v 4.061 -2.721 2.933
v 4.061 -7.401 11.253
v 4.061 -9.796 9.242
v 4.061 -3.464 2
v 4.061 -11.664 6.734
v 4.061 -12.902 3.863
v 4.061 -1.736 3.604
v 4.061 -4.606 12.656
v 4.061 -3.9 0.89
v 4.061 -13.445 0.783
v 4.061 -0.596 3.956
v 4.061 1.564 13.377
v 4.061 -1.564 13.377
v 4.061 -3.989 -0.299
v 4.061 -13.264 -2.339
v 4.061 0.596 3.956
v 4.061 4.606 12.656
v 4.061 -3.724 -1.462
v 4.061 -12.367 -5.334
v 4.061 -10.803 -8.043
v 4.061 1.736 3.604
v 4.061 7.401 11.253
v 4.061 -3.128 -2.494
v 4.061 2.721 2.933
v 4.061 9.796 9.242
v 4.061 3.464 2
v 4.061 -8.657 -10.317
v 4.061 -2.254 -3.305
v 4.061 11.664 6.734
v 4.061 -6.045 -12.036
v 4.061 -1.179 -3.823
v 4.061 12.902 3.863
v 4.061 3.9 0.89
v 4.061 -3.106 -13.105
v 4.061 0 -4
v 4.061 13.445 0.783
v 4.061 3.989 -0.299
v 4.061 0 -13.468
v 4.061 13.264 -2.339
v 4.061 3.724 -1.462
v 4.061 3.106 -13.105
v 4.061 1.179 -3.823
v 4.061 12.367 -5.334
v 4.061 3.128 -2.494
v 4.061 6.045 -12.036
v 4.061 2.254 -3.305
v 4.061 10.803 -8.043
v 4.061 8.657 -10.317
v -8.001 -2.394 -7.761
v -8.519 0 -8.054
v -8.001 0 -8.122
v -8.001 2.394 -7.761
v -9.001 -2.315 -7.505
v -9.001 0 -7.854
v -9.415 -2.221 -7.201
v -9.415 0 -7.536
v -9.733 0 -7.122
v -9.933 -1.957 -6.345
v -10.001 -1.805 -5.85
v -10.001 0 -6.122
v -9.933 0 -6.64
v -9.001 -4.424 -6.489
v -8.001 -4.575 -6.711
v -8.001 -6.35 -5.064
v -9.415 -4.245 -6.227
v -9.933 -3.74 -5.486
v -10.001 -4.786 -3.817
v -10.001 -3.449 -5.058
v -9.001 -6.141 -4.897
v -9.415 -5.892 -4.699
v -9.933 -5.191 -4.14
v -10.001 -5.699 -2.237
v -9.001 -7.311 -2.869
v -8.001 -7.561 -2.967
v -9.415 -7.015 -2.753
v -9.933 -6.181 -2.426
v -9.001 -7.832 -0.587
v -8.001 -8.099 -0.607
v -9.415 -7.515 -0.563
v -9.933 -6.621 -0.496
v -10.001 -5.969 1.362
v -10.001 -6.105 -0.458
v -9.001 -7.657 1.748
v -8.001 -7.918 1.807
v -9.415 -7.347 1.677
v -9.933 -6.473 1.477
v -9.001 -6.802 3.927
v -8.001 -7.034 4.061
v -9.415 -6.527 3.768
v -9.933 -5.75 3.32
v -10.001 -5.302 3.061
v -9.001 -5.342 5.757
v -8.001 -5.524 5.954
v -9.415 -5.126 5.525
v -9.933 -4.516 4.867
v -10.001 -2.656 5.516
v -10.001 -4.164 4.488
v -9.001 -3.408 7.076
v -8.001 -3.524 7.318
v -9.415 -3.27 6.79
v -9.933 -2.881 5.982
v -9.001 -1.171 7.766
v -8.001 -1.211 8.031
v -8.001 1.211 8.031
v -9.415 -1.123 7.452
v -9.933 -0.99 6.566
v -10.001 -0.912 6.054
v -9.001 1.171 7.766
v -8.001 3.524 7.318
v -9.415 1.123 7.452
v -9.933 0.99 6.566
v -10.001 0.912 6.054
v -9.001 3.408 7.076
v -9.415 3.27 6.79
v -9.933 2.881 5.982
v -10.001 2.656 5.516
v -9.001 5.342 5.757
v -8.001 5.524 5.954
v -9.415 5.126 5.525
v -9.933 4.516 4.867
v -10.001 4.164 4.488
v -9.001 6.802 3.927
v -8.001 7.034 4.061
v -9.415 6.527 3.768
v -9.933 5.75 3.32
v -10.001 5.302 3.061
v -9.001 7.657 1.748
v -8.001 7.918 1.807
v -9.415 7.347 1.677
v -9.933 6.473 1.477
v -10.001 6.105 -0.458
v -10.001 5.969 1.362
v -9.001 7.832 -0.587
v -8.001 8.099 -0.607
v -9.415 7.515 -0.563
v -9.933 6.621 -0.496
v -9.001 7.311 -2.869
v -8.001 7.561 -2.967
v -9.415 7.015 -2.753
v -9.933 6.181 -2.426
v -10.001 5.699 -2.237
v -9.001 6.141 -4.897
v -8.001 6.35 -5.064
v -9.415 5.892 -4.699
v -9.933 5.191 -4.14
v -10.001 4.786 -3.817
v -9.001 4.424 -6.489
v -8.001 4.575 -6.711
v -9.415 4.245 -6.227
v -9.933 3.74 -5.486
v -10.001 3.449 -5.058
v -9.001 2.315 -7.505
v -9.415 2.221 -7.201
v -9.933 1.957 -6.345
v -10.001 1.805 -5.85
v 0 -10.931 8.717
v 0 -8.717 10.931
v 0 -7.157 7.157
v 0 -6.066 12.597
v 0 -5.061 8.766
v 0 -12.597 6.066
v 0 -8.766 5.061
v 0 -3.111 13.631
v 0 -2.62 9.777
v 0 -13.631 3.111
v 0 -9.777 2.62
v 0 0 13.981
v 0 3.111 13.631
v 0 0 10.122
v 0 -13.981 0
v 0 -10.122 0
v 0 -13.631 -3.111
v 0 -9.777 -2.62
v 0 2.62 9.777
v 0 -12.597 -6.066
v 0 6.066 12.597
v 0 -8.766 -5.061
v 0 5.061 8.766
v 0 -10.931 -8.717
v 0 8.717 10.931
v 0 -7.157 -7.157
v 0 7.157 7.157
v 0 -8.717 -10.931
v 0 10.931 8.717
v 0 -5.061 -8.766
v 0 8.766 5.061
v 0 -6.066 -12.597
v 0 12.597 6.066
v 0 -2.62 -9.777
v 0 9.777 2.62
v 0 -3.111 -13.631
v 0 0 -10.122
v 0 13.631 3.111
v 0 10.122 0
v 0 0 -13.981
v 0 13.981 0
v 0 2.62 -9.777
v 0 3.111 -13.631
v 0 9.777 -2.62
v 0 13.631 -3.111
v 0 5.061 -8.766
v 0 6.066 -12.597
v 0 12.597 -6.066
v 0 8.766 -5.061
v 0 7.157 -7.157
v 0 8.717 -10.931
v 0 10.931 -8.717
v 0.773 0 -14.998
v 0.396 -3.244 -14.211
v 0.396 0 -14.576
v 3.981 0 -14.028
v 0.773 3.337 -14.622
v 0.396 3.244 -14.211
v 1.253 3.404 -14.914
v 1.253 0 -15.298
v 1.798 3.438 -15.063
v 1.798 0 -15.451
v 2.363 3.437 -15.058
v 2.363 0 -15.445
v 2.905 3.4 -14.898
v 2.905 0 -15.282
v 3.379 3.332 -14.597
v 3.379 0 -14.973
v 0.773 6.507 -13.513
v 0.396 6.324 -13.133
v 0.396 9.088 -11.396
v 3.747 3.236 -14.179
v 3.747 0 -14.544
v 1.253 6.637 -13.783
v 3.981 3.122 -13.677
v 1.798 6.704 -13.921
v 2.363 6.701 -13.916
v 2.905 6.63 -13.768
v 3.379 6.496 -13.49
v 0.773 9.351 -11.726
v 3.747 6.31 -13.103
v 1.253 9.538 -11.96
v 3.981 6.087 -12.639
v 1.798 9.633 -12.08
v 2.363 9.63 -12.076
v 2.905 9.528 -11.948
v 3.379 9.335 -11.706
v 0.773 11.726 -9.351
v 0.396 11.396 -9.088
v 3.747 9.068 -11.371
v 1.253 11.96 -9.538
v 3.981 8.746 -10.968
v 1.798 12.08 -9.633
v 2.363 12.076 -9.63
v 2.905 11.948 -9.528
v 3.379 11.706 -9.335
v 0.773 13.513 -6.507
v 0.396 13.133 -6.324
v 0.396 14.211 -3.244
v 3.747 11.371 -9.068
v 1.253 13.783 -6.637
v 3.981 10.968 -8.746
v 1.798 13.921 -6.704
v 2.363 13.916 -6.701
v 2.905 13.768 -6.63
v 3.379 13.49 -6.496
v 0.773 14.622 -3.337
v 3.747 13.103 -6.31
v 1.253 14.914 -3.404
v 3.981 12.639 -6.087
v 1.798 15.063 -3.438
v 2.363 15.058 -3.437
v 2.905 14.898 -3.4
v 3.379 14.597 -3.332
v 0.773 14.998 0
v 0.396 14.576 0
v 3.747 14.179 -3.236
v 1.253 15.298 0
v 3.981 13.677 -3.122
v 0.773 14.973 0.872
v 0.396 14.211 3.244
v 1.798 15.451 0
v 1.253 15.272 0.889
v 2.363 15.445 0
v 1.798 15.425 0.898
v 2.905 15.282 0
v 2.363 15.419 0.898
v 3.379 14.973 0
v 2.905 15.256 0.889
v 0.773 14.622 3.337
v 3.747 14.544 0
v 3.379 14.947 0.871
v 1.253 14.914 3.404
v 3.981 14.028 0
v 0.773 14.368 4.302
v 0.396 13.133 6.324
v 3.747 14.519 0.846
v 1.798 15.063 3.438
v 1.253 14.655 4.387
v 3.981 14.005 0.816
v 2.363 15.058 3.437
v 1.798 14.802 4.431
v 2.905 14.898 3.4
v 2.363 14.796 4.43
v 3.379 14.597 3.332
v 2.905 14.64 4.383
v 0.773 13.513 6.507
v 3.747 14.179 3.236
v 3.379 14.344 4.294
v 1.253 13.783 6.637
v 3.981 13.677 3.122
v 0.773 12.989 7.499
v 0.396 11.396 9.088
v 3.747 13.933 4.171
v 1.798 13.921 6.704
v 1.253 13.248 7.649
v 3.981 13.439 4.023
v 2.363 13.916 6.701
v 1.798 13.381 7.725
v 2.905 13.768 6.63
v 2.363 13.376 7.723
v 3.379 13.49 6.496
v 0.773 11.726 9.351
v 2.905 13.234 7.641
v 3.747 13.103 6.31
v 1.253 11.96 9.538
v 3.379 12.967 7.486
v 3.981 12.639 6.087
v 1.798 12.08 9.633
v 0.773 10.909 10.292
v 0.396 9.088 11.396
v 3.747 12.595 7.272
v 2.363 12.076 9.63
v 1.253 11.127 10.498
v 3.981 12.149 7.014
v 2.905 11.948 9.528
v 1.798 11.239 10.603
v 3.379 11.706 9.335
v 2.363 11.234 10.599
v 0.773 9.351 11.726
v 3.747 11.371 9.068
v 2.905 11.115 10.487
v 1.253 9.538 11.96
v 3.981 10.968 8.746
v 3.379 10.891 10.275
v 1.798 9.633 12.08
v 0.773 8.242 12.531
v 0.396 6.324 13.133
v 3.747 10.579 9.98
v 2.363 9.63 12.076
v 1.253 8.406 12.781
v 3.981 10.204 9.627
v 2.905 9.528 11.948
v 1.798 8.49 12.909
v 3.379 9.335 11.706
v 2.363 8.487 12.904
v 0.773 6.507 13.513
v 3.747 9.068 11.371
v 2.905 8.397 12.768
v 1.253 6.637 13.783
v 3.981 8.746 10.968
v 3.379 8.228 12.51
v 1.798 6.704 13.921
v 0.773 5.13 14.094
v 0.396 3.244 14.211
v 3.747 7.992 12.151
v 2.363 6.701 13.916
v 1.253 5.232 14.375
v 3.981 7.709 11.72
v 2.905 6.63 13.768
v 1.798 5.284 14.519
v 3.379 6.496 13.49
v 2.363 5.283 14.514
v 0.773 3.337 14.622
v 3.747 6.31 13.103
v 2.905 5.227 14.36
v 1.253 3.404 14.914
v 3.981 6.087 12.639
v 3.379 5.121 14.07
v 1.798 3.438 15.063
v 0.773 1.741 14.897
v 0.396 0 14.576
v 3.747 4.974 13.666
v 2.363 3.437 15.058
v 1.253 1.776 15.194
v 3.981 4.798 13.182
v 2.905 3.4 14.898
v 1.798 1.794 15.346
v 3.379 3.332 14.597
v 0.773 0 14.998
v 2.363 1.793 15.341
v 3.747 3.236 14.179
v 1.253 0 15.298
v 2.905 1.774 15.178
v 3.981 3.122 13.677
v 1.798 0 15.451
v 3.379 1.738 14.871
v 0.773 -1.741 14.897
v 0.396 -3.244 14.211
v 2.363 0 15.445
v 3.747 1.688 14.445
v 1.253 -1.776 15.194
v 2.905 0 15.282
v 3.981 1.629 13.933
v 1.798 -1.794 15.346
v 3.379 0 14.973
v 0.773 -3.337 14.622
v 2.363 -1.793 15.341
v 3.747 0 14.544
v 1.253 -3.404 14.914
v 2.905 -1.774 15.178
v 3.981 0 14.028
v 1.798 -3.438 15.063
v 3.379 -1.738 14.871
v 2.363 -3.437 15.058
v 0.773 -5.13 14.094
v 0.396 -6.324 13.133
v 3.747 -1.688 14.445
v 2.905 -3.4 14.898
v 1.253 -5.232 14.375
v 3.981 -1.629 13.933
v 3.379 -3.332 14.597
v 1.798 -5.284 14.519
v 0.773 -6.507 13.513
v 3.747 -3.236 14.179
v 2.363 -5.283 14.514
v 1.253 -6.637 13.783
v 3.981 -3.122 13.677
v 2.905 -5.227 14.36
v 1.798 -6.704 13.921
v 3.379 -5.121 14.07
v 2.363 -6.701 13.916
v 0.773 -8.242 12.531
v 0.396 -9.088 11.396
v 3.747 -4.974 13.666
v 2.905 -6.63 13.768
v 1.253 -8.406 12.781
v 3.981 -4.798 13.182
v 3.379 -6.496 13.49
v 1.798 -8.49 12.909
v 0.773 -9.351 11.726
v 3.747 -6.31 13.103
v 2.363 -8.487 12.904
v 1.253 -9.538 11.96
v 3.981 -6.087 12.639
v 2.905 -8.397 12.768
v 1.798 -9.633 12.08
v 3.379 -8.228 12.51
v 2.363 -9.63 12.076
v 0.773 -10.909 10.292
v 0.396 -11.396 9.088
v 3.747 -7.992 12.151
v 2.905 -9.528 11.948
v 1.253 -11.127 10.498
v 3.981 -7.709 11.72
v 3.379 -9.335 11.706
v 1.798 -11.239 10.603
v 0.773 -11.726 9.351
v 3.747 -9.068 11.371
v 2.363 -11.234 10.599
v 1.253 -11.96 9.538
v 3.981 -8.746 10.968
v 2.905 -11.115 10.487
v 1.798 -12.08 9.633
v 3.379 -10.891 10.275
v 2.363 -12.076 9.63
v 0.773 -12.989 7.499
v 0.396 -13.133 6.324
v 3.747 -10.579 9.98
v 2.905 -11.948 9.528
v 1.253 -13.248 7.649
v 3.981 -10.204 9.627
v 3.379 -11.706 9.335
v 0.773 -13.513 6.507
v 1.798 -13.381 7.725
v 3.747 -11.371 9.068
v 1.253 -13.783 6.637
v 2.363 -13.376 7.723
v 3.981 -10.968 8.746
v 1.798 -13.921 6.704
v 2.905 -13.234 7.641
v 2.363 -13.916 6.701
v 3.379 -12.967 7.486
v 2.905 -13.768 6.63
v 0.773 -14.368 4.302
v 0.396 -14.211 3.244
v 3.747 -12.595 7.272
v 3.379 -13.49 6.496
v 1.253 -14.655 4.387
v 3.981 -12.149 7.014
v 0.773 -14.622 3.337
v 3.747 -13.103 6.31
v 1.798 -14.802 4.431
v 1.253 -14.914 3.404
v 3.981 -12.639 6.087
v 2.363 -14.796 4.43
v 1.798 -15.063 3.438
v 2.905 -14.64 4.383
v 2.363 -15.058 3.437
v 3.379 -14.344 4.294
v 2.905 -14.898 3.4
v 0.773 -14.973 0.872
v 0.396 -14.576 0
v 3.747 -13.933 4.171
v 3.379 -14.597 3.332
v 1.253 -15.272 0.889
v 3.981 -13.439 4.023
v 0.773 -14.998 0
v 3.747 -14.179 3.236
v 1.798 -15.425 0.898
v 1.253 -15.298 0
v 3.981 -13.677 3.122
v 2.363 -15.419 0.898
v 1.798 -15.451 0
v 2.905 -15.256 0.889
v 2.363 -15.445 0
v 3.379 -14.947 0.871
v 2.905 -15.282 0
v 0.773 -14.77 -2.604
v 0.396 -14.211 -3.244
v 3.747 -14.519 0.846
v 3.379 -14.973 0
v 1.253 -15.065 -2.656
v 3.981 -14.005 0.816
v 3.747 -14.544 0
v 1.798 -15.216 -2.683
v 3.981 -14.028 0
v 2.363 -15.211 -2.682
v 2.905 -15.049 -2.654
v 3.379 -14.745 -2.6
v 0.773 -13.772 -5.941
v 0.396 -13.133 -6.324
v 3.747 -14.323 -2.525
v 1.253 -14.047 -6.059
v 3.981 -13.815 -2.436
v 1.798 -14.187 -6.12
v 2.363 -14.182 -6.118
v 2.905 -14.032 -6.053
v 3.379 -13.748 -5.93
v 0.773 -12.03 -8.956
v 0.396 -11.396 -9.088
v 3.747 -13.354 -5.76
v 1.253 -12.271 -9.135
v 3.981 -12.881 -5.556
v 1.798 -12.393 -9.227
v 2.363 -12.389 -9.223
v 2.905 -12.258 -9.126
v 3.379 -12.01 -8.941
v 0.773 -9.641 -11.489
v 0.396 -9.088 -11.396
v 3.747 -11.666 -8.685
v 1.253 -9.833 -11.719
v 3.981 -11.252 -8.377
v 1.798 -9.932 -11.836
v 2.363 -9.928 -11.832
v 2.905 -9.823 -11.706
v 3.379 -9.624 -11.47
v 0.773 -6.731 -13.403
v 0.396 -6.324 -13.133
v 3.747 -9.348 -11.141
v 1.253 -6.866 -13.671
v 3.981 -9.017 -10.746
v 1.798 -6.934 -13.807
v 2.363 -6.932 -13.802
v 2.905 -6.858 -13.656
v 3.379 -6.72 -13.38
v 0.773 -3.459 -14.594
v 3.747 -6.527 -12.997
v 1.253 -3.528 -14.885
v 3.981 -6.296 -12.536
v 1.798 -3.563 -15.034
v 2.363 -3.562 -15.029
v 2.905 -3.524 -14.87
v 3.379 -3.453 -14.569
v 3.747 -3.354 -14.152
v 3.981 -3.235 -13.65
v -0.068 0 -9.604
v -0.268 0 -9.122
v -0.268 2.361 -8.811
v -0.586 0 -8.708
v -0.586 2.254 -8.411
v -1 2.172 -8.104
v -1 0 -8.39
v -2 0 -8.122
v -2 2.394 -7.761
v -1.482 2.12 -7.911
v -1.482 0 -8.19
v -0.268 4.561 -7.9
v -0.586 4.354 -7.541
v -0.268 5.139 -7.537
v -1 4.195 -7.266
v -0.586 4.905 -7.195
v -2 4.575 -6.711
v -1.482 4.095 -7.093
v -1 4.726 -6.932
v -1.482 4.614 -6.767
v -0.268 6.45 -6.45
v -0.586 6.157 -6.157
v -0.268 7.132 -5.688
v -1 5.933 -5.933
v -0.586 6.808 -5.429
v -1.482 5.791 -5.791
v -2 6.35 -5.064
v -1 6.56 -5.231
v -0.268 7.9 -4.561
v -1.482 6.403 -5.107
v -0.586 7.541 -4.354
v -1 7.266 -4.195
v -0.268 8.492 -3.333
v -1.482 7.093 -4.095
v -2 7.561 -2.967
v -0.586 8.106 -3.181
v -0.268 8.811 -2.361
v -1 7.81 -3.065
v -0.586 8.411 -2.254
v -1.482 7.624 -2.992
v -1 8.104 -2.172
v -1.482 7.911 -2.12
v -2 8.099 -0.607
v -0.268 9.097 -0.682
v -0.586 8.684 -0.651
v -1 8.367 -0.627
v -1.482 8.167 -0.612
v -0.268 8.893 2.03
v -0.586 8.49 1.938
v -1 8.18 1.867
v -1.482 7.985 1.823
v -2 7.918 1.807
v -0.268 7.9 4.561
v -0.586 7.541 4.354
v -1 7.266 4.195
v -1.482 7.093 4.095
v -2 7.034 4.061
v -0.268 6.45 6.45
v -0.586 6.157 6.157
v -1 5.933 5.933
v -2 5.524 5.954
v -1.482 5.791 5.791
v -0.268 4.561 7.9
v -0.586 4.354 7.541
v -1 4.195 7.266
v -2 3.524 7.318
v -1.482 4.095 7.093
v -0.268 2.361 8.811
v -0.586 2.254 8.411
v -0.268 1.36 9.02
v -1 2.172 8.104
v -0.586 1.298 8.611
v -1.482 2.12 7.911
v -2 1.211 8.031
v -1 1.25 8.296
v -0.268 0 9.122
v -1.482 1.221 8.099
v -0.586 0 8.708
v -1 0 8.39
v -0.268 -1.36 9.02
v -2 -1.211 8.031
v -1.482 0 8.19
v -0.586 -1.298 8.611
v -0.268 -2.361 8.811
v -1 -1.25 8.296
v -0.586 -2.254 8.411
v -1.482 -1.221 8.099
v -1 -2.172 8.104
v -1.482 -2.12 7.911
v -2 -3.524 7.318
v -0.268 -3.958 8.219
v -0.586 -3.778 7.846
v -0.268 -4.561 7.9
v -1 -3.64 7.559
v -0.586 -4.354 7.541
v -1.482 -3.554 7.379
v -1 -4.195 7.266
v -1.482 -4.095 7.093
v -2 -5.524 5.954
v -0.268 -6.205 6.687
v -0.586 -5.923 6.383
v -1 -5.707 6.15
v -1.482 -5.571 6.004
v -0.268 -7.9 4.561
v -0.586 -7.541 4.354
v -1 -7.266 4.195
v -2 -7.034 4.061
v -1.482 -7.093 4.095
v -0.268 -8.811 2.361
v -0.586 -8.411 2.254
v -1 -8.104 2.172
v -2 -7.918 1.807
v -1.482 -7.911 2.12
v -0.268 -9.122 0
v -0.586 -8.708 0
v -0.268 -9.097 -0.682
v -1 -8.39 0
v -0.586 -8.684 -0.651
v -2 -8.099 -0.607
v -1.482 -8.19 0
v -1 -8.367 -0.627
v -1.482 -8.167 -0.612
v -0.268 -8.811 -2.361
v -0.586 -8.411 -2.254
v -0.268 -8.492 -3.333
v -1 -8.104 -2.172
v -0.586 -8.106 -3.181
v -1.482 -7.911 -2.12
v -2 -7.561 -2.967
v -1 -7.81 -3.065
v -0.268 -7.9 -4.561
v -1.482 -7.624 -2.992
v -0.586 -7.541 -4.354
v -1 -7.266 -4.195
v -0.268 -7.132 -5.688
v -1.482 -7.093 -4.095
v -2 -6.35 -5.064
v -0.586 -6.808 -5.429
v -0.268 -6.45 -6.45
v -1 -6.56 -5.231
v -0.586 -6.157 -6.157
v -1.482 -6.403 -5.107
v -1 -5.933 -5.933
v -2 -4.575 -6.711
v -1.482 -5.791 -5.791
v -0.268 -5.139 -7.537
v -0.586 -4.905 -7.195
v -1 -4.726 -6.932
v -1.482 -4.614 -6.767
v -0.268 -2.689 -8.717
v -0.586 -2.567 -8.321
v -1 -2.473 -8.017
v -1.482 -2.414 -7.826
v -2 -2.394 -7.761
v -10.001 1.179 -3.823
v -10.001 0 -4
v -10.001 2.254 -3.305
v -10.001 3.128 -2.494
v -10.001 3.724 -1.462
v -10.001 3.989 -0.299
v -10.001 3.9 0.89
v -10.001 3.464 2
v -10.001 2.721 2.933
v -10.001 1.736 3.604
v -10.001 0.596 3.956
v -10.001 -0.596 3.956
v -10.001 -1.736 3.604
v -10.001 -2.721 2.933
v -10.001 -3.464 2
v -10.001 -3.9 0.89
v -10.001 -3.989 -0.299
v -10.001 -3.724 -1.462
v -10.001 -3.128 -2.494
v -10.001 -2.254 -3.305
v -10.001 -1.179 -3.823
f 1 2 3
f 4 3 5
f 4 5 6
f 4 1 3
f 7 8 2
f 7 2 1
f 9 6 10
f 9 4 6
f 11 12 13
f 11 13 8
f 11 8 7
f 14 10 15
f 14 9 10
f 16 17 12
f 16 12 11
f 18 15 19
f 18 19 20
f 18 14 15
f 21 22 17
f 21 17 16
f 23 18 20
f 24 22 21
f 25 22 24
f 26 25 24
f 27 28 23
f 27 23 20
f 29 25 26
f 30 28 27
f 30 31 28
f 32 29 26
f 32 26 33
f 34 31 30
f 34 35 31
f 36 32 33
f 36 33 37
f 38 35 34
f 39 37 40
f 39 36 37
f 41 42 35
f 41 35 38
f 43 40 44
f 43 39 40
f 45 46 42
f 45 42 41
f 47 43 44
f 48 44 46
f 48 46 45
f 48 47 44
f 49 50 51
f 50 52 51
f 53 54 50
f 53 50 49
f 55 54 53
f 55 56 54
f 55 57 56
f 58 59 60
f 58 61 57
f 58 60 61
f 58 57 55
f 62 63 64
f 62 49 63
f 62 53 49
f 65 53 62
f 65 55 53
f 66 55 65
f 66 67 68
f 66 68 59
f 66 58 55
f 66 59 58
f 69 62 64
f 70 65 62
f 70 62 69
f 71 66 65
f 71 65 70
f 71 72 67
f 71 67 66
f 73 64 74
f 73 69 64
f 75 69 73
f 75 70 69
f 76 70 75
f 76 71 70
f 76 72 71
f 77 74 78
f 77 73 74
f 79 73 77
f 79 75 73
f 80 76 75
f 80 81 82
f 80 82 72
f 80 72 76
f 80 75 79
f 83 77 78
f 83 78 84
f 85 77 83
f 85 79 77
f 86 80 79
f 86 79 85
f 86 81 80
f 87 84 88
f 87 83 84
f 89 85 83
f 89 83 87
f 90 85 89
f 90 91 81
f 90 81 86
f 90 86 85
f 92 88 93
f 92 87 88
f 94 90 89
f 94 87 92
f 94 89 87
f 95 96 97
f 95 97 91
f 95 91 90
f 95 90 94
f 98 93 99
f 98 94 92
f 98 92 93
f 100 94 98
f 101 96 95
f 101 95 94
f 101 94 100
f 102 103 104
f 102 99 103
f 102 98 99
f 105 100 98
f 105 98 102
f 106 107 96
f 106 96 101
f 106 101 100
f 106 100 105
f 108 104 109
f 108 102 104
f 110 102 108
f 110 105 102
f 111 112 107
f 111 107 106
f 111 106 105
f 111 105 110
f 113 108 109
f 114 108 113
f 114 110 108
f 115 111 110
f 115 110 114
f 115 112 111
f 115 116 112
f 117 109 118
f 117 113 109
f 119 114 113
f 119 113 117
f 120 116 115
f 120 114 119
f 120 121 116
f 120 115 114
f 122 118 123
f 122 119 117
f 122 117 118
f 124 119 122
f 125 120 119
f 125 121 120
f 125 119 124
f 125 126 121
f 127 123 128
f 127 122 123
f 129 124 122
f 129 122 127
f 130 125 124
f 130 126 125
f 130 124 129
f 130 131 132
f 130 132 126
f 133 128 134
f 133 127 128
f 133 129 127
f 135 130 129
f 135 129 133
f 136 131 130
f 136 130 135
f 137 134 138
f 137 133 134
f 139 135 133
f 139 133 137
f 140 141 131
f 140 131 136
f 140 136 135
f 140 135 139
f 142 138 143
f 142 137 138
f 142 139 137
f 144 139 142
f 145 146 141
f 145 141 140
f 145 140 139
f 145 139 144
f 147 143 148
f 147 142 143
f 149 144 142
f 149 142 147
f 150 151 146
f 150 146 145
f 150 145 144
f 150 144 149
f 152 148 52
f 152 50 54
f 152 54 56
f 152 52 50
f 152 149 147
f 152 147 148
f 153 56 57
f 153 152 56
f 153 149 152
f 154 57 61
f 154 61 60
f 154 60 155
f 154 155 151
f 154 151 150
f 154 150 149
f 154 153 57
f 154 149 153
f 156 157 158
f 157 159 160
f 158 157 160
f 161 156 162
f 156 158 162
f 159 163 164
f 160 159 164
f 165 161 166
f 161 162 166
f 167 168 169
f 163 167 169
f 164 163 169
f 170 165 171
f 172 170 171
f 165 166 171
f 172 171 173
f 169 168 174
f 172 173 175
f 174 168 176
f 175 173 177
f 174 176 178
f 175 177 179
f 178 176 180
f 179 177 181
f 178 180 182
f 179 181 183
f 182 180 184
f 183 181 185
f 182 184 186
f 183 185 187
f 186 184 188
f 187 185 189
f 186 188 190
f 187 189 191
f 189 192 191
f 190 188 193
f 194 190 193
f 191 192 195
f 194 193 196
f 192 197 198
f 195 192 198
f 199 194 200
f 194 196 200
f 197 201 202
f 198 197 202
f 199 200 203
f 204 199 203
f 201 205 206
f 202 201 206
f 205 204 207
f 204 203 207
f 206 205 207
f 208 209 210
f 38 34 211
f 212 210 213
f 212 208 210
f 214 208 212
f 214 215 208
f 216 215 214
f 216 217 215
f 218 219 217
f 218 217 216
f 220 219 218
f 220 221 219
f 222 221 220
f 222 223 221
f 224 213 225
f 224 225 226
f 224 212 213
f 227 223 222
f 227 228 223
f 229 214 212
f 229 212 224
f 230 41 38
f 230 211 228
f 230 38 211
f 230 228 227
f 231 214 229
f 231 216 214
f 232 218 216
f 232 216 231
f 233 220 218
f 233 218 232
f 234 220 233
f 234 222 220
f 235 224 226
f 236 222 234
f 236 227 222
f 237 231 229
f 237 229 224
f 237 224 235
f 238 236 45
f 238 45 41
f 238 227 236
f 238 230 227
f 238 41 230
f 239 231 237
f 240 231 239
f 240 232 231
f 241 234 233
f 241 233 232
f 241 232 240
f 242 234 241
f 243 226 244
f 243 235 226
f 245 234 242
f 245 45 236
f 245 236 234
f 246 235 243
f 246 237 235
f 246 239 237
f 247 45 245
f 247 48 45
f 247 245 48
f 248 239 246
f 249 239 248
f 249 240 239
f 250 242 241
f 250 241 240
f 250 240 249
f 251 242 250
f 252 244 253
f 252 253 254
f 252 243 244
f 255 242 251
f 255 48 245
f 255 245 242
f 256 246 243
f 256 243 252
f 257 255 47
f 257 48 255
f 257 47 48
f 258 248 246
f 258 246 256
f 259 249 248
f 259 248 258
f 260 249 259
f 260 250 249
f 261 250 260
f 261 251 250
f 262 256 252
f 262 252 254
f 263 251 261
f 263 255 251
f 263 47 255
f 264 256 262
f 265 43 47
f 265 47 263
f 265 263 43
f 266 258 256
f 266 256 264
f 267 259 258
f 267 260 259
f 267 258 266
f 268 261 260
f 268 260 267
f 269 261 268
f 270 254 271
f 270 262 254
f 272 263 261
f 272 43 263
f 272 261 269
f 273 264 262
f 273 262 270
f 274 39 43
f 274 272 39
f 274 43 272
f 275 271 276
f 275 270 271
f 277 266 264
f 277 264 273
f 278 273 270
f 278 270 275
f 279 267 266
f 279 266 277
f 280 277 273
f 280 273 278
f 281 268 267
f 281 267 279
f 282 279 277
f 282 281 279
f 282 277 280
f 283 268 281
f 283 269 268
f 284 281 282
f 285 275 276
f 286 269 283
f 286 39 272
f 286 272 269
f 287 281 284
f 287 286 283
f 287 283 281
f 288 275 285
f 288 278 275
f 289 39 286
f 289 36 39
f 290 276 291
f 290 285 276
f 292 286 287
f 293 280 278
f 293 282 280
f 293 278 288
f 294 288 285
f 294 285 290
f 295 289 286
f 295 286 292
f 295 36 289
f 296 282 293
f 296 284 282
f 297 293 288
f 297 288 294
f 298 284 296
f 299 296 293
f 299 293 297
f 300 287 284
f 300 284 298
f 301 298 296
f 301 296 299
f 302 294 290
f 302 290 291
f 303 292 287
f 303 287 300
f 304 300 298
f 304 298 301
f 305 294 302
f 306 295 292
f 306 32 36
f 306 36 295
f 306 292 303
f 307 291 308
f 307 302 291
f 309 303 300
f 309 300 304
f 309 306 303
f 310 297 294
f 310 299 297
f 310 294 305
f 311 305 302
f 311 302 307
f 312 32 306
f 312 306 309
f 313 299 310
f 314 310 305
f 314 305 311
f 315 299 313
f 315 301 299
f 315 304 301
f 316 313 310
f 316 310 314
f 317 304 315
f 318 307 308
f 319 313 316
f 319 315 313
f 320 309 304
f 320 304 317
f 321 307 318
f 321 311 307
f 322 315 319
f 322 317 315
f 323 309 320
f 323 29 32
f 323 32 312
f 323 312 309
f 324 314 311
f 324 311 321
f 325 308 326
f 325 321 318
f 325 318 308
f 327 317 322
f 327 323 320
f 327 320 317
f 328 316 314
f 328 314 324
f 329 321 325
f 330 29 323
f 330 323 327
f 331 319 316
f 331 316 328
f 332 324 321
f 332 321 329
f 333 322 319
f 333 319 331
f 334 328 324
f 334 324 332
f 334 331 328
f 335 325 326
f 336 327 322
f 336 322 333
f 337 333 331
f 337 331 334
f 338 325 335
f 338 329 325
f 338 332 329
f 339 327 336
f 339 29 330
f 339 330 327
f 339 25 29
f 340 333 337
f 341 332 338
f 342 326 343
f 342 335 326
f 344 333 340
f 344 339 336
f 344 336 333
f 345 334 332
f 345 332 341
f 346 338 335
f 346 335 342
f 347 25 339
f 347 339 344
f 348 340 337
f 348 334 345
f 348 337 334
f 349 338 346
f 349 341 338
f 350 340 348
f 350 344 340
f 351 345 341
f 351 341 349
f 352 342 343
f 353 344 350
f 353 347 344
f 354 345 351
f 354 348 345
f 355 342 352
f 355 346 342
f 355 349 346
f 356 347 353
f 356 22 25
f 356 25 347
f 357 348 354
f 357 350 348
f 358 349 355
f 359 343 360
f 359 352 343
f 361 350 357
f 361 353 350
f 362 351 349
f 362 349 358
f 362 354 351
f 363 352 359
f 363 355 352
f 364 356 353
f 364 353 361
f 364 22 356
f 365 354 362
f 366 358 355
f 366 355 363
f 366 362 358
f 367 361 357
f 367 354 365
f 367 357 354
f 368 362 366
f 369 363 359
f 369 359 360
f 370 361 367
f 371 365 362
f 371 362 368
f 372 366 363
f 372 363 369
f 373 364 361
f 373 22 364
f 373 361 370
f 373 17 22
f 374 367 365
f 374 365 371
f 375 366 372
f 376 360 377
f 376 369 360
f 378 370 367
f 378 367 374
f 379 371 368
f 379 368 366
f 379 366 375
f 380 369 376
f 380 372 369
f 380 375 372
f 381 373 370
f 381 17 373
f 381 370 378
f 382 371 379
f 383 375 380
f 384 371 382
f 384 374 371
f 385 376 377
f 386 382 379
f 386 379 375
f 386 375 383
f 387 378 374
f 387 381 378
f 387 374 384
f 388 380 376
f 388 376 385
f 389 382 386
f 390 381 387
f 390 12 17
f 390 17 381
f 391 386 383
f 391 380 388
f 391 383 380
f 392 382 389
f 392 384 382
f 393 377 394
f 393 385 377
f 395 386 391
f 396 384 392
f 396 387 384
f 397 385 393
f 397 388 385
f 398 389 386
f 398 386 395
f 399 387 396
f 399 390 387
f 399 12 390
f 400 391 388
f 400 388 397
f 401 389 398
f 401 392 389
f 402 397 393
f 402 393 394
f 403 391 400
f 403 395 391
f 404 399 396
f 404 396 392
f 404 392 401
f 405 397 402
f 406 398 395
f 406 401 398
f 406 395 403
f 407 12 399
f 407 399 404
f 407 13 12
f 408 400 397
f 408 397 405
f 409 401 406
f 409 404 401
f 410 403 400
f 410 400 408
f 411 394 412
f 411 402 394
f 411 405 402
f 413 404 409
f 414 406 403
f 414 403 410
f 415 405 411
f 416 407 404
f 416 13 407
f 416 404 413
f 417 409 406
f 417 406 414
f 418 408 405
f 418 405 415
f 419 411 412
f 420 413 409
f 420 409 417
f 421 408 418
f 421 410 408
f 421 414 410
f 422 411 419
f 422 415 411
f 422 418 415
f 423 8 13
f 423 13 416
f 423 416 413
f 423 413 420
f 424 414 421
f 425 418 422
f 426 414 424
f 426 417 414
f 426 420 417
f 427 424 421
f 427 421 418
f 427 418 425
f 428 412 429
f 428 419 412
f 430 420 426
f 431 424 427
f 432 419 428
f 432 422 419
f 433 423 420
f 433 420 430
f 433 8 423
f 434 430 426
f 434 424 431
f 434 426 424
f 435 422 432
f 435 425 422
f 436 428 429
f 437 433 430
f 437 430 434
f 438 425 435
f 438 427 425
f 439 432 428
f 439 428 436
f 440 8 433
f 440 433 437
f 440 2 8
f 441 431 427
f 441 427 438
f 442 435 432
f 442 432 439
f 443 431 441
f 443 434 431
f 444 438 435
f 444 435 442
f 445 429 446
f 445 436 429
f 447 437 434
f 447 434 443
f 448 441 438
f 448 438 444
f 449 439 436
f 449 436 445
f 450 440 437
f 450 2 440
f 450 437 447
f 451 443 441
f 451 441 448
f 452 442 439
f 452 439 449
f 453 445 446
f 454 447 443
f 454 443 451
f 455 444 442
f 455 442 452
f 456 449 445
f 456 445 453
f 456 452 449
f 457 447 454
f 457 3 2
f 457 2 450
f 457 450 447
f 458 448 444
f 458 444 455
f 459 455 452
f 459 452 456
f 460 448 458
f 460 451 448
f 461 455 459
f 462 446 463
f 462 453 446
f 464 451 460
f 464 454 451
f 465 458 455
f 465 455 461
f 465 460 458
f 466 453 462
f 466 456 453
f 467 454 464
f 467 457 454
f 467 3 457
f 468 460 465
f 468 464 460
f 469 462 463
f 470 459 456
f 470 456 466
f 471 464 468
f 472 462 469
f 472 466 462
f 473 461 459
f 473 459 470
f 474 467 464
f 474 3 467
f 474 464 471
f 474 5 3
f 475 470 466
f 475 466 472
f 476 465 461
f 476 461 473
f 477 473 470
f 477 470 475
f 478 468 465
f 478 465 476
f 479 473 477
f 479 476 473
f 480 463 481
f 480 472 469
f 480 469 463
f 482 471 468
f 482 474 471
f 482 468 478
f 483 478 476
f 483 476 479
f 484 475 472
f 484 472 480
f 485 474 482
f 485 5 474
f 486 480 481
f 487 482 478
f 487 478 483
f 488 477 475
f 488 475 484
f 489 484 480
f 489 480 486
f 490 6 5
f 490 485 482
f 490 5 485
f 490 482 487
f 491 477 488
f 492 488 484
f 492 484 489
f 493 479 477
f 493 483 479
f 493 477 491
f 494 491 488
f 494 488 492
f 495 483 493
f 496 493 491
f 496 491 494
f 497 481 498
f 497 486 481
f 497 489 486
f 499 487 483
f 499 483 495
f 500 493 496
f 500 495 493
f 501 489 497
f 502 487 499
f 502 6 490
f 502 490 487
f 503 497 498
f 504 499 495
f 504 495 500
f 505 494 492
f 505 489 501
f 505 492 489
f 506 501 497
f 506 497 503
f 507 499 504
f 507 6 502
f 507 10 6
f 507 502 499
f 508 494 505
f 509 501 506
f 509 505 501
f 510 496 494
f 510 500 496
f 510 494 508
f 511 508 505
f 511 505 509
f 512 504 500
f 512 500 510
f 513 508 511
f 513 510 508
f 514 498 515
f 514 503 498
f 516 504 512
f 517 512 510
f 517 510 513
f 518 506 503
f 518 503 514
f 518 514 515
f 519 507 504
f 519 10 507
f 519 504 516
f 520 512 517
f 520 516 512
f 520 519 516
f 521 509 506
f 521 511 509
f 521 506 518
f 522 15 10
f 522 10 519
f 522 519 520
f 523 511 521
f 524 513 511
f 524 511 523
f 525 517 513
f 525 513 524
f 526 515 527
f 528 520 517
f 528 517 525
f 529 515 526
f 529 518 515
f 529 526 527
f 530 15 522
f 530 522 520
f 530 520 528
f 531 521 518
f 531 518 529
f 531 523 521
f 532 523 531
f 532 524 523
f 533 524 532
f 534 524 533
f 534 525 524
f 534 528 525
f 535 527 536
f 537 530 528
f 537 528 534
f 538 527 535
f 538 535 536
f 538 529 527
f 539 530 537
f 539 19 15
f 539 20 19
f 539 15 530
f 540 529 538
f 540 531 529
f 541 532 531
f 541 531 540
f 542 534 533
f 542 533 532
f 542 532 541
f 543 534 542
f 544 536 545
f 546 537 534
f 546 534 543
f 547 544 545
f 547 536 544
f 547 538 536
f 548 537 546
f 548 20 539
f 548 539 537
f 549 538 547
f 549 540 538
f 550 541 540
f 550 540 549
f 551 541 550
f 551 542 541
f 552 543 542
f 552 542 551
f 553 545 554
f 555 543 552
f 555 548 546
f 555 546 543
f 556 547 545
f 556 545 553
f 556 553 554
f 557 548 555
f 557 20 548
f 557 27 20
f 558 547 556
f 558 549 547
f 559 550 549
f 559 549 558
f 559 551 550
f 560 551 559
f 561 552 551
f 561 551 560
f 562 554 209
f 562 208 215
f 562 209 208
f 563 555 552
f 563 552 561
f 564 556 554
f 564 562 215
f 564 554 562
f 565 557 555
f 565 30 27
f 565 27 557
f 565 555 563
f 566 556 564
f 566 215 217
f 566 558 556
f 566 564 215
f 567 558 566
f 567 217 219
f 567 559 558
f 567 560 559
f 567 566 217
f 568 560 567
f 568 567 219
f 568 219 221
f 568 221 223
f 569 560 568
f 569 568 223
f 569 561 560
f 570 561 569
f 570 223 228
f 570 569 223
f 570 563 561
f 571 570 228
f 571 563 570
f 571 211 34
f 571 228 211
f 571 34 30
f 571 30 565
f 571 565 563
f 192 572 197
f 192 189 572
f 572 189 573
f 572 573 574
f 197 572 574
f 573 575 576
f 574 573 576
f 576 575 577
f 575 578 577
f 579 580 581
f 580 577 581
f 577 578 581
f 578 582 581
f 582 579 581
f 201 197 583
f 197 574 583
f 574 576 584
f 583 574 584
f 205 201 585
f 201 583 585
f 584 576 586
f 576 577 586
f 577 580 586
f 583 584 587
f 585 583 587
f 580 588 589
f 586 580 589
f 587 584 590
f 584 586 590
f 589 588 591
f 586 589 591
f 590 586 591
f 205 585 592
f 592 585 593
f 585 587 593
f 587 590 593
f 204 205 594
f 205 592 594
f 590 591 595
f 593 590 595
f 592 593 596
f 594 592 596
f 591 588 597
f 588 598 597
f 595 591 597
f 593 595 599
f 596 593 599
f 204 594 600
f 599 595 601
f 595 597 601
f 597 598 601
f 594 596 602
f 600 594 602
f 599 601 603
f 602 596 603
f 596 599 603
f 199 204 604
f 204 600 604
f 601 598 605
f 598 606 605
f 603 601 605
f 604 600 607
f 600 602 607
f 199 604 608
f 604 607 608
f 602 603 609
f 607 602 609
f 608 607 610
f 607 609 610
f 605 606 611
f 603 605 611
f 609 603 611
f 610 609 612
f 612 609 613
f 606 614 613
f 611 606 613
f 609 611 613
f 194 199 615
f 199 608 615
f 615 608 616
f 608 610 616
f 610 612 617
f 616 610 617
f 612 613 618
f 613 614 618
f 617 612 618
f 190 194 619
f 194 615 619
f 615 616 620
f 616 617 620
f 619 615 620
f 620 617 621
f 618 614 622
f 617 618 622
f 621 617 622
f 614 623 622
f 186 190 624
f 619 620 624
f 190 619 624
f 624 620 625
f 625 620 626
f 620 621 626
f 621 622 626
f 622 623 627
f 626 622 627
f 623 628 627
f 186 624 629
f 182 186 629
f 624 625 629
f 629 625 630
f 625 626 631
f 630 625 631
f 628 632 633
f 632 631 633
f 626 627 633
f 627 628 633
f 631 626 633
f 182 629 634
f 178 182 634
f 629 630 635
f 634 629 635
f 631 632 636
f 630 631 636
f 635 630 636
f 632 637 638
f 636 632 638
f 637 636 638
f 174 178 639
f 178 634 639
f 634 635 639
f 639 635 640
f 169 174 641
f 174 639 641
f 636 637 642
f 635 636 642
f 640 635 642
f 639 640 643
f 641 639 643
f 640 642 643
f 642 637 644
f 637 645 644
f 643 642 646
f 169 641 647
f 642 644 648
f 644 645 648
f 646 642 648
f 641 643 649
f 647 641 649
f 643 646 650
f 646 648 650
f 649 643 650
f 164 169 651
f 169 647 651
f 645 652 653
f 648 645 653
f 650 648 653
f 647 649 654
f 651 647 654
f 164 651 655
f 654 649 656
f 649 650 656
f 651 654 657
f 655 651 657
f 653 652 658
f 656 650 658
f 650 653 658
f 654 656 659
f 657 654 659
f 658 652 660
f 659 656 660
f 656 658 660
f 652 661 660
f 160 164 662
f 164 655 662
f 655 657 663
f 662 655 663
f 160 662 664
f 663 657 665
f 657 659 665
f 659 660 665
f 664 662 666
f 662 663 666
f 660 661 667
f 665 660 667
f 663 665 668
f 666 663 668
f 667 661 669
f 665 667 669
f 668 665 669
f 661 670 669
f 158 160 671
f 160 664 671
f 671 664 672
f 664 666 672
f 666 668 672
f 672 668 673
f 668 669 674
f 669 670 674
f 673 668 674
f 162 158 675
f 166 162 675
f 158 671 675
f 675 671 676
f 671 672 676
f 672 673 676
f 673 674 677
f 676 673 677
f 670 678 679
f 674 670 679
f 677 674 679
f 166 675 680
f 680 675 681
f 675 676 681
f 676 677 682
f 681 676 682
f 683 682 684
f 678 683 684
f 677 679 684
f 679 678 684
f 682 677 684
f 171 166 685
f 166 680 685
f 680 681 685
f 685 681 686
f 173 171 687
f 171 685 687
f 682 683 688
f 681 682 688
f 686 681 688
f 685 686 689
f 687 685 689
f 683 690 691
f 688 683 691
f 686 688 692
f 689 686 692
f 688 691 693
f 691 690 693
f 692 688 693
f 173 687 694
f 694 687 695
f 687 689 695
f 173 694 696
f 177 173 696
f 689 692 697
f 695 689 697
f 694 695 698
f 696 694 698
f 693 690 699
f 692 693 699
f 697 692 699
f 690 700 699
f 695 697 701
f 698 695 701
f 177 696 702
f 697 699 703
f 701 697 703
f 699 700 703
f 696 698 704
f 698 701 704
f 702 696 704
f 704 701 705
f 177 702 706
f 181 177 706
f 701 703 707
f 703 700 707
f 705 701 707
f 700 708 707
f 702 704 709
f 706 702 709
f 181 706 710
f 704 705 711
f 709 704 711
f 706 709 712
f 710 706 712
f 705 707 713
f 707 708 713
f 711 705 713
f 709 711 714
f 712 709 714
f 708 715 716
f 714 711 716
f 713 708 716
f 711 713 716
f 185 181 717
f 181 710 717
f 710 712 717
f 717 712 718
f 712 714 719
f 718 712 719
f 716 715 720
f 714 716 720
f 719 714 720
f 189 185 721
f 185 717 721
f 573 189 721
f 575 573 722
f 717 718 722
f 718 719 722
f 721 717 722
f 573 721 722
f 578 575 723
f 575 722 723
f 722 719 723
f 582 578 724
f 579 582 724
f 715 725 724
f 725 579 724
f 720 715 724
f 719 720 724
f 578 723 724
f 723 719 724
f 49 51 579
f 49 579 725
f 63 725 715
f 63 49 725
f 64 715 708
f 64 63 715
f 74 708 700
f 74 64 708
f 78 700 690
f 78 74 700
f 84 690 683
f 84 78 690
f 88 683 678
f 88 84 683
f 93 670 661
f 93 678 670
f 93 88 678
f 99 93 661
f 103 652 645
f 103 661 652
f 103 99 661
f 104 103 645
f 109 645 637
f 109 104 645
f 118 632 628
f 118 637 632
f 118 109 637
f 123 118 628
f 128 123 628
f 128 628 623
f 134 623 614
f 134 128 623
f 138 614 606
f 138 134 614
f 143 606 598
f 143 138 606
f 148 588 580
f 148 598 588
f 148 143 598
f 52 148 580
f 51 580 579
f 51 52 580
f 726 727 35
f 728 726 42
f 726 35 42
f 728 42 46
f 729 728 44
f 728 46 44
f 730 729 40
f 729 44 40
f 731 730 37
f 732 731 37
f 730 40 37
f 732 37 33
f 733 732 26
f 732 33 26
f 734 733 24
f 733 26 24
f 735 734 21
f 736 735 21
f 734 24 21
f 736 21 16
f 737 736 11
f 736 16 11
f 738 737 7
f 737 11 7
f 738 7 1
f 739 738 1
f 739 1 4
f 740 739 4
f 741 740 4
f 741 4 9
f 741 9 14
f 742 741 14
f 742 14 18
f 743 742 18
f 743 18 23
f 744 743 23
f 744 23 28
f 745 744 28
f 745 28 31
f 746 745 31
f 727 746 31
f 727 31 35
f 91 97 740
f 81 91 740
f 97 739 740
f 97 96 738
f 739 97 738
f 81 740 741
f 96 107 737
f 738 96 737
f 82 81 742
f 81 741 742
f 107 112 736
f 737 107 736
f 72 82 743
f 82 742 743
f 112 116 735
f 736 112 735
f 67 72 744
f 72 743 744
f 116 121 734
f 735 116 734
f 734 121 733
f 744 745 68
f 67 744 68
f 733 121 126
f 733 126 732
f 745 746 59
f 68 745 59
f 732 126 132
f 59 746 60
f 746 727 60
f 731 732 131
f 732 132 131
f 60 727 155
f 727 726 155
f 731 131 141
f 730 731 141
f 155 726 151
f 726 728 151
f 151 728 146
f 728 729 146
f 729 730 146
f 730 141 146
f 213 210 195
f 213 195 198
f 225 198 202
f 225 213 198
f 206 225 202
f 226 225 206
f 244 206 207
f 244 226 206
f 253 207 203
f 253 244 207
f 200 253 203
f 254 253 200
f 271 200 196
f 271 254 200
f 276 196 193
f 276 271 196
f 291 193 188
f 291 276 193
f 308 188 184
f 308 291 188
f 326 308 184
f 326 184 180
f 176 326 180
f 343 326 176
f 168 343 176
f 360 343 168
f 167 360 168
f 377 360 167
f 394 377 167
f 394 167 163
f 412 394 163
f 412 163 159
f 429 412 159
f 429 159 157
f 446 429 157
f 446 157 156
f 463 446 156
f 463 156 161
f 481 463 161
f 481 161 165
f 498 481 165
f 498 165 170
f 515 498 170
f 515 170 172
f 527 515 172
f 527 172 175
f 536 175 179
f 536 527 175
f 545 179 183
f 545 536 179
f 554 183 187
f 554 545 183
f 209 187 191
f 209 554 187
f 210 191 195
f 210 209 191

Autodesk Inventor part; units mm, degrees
ref_plane "YZ Plane" through (0, 0, 0) normal (1, 0, 0) x (0, 1, 0)
ref_plane "XZ Plane" through (0, 0, 0) normal (0, 1, 0) x (-1, 0, 0)
ref_plane "XY Plane" through (0, 0, 0) normal (0, 0, 1) x (1, 0, 0)
sketch "Sketch1" plane through (0, 0, 0) normal (0, 1, 0) x (-1, 0, 0)
  line L0 (10.0011, -4.0004) -> (-4.061, -4.0004)
  line L1 (-4.061, -4.0004) -> (-4.061, -20.083)
  line L2 (-4.061, -20.083) -> (0, -13.9813)
  line L3 (0, -13.9813) -> (0, -8.1221)
  line L4 (0, -8.1221) -> (10.0011, -8.1221)
  line L5 (10.0011, -8.1221) -> (10.0011, -4.0004)
  line L6 (12.8135, 0) -> (-6.8735, 0) projected
  point P0 (0, 0)
revolve "Revolution1" add sketch "Sketch1" angle 360 about axis through (-10, 0, 0) along (1, 0, 0)
fillet "Fillet1" radius 2 1 edges at (4.061, 0, 20.083)
fillet "Fillet2" radius 2 2 edges at (-10.0011, 0, 8.1221) (0, 0, 8.1221)
properties part number "revolution_example"
